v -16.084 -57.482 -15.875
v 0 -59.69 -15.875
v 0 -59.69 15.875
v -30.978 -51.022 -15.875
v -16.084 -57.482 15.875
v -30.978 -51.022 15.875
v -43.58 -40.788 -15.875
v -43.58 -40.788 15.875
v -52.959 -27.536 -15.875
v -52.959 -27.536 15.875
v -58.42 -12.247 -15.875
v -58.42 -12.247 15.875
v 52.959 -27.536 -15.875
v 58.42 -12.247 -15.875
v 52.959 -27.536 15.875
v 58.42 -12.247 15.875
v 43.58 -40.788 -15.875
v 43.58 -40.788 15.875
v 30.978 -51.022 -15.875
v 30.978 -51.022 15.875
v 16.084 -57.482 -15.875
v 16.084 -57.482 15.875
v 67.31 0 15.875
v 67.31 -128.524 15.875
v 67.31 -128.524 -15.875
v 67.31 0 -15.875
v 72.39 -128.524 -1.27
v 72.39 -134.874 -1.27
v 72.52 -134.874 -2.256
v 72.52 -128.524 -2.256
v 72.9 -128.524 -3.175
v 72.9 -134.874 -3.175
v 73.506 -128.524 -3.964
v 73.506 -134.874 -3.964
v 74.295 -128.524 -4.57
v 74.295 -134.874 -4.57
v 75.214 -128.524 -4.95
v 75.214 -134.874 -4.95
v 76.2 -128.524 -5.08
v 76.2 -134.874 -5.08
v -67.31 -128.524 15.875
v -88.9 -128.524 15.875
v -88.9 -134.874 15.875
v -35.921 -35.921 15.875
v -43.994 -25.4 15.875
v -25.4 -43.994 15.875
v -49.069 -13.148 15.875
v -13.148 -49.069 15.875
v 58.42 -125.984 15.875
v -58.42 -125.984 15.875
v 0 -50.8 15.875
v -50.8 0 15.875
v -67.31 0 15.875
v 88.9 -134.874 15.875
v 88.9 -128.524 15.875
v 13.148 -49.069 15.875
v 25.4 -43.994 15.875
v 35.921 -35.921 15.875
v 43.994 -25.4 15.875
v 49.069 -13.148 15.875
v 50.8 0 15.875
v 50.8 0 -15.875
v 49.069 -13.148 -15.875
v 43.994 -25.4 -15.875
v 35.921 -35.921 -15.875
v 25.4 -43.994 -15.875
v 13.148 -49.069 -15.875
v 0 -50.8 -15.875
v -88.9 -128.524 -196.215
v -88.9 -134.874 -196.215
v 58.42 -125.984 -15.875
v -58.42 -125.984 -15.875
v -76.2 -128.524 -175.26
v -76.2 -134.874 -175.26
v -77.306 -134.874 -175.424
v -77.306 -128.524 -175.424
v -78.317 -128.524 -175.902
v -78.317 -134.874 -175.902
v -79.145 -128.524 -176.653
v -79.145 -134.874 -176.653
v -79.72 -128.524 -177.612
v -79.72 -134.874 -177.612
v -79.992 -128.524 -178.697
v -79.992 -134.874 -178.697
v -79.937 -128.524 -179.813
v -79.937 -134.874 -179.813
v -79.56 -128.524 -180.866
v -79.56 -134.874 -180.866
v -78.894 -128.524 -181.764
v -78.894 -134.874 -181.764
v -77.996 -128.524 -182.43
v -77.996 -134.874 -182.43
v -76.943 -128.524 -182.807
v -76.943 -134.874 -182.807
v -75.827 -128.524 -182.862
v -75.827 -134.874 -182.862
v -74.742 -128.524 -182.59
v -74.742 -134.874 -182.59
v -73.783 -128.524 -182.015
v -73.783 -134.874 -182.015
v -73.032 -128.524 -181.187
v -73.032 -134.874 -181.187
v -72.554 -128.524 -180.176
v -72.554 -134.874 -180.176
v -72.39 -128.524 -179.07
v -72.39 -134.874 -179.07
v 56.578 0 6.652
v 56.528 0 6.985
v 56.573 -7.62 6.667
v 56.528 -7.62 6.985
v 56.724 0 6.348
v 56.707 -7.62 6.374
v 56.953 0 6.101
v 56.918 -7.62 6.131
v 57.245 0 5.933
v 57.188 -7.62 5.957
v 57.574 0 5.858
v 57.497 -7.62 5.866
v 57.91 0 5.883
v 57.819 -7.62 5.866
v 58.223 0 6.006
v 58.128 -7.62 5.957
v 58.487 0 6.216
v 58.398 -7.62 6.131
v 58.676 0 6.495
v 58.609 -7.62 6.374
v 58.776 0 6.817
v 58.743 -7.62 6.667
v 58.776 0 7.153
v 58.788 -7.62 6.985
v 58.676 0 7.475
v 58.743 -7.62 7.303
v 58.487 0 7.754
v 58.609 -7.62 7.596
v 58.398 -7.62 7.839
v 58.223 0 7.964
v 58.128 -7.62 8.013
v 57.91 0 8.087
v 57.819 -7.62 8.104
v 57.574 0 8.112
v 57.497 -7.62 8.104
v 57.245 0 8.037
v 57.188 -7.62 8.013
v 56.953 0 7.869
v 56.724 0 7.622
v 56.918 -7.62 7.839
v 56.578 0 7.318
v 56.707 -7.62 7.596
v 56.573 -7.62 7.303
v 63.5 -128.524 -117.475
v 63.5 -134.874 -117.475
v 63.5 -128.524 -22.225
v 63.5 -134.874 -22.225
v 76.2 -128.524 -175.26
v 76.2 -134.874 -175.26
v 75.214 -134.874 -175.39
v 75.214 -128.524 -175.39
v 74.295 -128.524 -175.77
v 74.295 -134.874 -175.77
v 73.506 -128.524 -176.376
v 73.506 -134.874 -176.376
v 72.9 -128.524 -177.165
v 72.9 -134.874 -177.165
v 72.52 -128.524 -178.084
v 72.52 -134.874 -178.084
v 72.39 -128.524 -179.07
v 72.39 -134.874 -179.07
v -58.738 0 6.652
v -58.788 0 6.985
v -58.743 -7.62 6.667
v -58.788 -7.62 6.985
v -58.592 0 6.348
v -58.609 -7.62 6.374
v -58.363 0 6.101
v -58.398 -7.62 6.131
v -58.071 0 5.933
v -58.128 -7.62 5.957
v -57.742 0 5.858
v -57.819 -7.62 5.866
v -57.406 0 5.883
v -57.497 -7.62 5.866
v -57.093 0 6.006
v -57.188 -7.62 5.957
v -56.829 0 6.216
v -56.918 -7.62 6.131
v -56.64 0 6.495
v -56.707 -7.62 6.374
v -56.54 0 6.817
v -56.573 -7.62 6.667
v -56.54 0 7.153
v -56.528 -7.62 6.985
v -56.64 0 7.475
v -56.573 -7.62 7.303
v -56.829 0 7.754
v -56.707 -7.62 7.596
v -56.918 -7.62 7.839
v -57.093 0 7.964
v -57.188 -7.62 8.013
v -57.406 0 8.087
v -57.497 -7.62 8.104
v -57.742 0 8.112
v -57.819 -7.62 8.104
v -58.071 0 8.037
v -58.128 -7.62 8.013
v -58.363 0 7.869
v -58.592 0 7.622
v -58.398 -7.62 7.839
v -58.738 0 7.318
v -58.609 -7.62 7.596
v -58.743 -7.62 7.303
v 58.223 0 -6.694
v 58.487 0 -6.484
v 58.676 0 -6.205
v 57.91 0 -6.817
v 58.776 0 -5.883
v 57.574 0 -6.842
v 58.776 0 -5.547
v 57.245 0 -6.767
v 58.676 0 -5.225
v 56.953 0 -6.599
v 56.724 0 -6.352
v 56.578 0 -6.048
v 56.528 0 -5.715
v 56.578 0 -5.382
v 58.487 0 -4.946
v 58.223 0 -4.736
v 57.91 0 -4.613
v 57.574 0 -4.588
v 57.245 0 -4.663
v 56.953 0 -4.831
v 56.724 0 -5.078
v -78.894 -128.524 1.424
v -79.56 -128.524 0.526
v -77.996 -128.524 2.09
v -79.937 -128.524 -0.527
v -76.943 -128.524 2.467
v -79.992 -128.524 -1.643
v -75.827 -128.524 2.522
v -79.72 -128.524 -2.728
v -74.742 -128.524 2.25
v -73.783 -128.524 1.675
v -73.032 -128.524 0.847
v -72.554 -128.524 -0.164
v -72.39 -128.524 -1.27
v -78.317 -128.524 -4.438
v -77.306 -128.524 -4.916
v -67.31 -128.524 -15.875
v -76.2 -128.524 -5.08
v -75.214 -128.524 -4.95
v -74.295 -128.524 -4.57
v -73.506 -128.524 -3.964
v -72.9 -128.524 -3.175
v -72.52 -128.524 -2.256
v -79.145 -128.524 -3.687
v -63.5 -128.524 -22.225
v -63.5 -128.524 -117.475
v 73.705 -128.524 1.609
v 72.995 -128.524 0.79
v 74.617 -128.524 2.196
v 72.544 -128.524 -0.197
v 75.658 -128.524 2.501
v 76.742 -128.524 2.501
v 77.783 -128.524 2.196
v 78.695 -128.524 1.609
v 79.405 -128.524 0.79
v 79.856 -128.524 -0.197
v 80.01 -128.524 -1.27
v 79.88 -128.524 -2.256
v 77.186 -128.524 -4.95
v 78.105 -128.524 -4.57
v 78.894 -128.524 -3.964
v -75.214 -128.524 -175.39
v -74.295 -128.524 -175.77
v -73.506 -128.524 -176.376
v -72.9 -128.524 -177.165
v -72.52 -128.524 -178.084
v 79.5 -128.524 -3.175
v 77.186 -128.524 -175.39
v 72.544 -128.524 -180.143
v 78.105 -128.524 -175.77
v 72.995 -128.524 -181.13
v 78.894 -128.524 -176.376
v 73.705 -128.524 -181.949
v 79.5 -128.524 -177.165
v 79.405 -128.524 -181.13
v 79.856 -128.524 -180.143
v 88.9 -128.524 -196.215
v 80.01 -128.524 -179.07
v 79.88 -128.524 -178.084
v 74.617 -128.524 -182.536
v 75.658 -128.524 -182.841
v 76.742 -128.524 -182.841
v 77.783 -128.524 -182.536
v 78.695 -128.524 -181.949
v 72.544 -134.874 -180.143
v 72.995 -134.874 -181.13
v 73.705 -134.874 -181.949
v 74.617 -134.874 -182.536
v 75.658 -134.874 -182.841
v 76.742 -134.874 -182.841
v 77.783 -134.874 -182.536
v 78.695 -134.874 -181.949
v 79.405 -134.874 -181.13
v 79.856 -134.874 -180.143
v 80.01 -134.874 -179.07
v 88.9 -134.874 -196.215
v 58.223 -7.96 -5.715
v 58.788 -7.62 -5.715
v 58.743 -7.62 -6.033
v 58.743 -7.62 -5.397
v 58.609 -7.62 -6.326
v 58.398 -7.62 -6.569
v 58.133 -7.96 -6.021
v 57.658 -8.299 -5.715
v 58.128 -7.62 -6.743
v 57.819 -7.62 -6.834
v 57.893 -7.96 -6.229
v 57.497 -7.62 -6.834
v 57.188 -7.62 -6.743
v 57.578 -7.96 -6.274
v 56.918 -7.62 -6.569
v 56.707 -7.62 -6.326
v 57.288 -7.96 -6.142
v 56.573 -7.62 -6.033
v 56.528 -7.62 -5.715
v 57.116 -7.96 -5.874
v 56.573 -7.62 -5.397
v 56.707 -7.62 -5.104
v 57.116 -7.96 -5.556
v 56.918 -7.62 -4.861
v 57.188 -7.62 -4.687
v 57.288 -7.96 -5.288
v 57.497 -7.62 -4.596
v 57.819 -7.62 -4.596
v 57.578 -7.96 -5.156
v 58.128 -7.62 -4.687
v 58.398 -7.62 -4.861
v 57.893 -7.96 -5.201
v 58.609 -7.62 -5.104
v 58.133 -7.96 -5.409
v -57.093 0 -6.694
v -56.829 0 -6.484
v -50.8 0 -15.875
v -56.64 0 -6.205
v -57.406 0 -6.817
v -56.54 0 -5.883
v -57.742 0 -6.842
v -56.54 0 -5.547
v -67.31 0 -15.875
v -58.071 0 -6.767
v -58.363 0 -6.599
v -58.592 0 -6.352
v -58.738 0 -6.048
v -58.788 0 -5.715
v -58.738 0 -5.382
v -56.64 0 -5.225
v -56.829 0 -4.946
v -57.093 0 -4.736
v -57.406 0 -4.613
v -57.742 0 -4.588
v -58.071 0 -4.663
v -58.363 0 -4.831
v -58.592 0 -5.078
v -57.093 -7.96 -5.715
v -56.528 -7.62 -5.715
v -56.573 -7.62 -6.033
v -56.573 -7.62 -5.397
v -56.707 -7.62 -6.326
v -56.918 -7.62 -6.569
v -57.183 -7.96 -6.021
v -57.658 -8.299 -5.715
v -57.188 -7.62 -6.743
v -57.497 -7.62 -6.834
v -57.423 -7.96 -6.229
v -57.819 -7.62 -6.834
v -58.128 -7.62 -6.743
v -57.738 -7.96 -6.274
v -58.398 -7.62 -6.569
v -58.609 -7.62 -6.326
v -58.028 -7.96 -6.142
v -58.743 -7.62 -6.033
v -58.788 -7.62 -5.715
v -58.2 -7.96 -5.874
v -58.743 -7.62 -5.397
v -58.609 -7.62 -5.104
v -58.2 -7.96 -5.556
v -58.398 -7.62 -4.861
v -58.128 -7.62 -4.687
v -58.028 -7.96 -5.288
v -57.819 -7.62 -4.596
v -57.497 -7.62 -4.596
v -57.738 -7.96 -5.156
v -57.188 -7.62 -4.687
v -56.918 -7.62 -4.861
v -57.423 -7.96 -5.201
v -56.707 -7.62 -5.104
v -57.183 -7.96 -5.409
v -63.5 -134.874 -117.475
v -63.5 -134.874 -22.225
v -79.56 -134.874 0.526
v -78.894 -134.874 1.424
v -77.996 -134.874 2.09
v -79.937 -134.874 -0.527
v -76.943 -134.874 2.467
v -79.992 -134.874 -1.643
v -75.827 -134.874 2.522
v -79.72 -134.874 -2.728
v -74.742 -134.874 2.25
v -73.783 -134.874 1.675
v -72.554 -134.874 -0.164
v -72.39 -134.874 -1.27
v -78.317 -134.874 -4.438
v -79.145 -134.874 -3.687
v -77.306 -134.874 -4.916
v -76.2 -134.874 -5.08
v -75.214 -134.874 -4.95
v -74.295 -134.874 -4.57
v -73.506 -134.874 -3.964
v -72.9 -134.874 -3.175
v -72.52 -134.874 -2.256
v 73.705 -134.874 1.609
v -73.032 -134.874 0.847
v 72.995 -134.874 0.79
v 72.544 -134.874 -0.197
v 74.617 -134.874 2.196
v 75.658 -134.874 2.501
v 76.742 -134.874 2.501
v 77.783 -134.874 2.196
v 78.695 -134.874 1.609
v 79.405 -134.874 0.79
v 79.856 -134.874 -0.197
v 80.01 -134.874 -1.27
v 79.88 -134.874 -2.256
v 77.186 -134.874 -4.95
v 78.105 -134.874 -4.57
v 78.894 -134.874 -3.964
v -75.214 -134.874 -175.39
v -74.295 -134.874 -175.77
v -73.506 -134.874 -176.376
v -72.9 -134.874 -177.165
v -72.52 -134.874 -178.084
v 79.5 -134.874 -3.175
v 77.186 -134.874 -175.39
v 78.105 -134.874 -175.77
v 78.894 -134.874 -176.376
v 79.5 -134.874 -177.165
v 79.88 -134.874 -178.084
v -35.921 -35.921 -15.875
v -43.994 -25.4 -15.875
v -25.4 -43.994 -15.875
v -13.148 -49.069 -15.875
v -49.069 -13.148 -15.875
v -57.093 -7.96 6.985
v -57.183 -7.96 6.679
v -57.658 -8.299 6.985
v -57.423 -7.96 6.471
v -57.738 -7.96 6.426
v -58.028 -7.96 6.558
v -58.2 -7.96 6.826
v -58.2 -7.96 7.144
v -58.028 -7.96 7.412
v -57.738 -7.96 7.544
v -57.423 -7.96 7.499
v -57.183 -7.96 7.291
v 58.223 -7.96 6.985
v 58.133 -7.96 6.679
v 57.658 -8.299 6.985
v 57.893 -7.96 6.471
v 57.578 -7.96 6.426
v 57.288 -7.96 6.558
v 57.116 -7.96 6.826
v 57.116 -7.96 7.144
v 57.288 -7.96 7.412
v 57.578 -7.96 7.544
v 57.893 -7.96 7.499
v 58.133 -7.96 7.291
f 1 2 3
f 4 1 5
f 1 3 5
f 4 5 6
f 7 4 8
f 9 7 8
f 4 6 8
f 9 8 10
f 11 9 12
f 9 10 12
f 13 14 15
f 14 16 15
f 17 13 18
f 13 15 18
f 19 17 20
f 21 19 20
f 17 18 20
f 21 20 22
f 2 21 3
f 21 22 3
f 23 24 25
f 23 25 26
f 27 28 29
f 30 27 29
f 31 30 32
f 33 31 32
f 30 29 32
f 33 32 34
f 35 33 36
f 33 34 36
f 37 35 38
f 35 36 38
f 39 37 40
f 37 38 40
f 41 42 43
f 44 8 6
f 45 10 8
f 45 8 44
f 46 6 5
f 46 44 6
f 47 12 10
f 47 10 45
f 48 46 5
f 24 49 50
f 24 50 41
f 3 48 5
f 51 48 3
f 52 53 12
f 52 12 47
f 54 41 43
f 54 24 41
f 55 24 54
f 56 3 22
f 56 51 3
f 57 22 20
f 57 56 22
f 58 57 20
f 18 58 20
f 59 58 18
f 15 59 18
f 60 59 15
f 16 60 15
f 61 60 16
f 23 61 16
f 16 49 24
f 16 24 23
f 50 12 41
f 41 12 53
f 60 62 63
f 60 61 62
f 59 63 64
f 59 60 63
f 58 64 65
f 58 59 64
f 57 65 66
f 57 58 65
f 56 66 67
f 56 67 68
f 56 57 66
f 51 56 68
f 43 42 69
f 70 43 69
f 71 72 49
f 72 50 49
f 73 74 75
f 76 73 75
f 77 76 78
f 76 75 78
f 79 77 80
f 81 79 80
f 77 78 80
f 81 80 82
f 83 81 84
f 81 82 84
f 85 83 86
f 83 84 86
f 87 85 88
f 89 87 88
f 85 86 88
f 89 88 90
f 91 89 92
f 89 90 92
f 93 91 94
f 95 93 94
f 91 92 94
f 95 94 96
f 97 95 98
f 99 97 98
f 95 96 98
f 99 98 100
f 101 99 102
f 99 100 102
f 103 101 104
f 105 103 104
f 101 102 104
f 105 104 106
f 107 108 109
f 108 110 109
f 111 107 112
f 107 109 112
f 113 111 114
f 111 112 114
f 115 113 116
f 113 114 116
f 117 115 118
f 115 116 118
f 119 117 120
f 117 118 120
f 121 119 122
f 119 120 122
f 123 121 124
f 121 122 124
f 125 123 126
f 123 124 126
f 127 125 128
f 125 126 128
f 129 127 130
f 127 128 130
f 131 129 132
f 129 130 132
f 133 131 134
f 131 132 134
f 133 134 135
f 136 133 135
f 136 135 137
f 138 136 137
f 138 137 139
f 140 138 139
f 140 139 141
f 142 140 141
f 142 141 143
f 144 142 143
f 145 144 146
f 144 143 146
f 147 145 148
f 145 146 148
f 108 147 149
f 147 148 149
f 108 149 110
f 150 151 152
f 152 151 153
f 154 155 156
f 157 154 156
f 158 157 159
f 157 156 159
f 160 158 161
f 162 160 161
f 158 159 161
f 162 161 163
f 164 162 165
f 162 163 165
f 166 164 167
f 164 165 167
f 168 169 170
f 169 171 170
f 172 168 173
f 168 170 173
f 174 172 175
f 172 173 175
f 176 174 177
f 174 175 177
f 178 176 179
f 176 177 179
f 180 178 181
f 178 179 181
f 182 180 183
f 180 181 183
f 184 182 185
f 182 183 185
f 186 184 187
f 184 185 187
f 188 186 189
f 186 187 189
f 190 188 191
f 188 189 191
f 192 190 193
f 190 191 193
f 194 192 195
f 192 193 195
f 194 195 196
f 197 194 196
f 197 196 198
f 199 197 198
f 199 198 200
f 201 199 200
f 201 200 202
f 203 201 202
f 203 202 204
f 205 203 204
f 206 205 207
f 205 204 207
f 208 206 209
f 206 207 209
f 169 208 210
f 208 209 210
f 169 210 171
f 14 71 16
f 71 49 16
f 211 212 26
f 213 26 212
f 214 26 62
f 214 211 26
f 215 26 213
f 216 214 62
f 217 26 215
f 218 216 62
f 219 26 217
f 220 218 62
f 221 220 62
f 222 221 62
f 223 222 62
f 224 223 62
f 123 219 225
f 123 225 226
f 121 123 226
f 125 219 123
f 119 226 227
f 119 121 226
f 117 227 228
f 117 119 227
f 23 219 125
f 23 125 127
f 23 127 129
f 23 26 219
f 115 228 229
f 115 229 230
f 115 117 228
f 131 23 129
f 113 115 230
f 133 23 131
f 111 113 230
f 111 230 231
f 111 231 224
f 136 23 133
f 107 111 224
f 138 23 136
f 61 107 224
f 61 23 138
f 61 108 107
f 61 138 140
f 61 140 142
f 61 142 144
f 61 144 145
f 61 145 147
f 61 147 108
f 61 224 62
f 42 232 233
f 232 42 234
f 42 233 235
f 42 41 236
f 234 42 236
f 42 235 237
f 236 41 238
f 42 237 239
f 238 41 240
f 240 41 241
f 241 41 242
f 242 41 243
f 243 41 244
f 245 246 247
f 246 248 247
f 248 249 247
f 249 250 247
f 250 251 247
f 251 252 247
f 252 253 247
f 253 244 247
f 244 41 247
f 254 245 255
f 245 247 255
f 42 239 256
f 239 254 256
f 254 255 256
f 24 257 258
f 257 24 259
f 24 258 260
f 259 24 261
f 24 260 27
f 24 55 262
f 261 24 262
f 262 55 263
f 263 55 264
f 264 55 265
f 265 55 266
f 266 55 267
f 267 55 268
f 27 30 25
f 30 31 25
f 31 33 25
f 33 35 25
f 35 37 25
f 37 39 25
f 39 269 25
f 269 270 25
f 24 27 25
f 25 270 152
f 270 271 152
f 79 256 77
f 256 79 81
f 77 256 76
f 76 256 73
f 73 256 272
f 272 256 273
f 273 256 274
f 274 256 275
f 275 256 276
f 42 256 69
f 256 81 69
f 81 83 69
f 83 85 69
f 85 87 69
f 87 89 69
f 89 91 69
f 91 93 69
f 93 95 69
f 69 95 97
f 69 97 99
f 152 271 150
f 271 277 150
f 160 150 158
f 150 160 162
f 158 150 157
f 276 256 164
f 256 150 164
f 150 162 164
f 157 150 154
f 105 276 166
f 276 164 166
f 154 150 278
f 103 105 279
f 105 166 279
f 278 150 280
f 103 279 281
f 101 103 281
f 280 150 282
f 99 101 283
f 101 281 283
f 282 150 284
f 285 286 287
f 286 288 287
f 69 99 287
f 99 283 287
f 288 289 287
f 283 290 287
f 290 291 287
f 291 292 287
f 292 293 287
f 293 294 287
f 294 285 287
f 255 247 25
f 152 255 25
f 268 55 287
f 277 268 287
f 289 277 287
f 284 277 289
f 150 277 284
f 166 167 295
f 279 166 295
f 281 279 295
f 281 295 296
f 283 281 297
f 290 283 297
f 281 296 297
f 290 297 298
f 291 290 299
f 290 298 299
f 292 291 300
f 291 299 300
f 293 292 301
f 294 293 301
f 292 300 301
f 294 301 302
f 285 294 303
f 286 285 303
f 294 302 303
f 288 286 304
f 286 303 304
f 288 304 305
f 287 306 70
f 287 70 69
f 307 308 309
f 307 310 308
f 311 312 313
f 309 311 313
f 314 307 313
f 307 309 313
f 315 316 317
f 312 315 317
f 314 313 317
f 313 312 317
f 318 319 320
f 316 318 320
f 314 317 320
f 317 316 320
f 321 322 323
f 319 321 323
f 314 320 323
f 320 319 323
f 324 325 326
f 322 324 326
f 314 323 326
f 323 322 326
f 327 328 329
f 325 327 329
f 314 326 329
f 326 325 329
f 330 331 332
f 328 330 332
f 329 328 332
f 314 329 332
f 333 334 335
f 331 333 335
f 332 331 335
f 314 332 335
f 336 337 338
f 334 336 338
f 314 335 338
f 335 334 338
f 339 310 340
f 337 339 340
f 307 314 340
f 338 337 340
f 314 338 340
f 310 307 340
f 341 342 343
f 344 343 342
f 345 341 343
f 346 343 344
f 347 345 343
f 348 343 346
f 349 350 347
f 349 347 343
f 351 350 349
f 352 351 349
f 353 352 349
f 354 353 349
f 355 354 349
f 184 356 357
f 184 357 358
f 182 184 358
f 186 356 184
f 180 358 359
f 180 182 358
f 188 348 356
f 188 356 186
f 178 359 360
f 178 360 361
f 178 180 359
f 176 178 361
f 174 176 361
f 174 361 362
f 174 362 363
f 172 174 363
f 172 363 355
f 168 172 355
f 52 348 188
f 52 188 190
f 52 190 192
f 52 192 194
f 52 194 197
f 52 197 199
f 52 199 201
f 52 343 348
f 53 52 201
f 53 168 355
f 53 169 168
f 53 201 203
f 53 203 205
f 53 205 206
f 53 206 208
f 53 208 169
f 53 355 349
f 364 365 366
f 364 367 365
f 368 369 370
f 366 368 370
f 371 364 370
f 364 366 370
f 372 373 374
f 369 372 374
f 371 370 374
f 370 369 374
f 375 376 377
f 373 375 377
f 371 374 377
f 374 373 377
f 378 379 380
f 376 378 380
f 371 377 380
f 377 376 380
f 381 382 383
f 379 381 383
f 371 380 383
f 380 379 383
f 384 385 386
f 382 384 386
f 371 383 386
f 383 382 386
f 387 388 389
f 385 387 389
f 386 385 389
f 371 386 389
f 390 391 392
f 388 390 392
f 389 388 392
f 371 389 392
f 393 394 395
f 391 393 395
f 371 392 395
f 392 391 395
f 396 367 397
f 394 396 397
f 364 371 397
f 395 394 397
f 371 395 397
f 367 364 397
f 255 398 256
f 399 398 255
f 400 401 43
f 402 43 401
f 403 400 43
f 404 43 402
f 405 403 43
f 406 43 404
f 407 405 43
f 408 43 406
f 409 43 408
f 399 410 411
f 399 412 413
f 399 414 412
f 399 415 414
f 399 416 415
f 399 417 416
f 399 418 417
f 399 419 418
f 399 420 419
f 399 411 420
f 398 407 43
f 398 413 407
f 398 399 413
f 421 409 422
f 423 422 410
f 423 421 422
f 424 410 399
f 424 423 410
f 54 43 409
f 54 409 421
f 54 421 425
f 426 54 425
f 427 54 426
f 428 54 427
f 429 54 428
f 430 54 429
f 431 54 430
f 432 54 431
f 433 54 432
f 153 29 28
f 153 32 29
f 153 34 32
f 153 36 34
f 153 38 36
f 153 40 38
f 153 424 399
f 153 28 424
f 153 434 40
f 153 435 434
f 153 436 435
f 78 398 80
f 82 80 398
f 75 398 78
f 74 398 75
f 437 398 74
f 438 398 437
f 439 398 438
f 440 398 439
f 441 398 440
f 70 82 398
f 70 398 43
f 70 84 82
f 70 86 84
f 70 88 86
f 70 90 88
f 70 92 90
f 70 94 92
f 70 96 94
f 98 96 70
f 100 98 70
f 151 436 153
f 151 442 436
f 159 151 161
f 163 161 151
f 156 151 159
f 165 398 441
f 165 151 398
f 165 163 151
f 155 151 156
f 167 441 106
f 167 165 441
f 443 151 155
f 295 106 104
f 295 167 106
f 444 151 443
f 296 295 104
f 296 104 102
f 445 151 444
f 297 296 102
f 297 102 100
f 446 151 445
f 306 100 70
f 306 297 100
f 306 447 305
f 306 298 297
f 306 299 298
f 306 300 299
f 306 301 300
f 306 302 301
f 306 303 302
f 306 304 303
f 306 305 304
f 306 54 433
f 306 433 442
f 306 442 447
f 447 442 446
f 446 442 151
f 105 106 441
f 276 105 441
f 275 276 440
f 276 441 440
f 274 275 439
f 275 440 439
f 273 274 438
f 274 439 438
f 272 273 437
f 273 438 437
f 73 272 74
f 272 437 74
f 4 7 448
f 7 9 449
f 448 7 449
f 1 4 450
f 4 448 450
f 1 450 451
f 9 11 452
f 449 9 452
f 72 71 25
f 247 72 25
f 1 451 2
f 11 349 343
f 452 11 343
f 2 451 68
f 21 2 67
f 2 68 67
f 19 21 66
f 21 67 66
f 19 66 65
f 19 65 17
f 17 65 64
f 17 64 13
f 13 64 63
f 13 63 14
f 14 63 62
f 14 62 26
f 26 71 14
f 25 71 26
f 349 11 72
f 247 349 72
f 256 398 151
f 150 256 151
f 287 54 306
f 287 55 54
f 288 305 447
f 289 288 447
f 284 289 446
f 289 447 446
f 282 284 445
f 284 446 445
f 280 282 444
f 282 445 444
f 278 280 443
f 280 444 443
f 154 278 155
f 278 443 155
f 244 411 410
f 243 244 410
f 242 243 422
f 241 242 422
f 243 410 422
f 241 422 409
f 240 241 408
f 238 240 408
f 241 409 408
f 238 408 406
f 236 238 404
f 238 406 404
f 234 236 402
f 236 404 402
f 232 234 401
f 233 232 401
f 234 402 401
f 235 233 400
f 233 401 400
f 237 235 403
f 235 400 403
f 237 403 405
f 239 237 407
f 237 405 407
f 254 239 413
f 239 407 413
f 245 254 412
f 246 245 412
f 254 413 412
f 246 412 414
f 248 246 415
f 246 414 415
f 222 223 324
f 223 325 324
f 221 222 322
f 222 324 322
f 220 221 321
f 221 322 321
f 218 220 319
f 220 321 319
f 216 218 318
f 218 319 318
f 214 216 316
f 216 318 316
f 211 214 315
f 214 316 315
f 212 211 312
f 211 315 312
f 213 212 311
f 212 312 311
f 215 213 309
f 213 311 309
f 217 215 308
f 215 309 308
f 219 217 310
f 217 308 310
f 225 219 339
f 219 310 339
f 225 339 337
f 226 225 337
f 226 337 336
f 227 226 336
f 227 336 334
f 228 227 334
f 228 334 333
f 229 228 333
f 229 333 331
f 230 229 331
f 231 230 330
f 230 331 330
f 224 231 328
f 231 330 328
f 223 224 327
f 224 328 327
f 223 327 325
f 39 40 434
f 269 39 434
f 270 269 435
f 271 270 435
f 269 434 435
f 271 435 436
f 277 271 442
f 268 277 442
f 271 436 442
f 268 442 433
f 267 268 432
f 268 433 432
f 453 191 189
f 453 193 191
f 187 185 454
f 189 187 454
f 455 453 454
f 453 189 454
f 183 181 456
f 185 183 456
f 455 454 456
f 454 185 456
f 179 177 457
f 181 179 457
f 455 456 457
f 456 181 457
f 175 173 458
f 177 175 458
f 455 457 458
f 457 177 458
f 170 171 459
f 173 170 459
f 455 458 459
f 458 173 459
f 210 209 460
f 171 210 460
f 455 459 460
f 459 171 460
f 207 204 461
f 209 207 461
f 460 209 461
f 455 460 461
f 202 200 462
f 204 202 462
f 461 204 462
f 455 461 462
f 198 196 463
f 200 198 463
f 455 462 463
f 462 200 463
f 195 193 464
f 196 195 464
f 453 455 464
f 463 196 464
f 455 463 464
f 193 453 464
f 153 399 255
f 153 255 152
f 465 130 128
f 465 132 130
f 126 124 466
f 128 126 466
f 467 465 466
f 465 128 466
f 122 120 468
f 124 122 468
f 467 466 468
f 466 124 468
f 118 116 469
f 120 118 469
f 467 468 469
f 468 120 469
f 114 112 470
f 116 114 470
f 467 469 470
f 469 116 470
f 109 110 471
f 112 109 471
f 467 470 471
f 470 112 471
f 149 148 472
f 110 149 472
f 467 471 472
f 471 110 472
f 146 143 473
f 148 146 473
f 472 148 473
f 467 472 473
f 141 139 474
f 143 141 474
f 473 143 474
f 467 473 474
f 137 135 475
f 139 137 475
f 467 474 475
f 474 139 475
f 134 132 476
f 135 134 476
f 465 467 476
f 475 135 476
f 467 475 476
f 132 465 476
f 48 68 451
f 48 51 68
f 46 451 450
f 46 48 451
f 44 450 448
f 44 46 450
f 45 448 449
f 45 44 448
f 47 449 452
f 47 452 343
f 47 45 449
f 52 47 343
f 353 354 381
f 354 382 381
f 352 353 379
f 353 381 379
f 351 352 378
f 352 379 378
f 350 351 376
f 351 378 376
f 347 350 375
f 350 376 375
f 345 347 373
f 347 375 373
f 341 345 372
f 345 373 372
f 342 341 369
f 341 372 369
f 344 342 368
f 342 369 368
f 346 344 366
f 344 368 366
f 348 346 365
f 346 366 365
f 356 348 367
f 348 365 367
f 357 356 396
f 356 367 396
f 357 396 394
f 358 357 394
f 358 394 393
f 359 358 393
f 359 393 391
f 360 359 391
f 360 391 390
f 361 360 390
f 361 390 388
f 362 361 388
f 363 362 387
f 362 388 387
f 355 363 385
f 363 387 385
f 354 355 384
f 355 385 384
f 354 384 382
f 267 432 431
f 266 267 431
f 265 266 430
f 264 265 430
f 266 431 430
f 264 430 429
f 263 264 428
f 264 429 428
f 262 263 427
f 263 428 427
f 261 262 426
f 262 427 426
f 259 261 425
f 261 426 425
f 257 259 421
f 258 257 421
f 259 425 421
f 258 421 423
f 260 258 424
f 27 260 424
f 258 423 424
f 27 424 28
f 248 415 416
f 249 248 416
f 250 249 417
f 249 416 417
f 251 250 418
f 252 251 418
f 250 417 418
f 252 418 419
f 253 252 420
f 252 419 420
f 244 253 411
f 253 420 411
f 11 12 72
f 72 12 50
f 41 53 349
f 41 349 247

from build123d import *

# Parameters (mm, degrees)
BOSS_EXTRUDE1_DEPTH       = 15.875
SHELL1_T                  = -8.89
F_4_40_TAPPED_HOLE1_D     = 2.2606
F_4_40_TAPPED_HOLE1_DEPTH = 7.62
F_4_40_TAPPED_HOLE1_TIP   = 0.679153
SKETCH6_W                 = 180.34
SKETCH6_H                 = 6.35
BOSS_EXTRUDE2_DEPTH       = 177.8
SKETCH7_W                 = 127
SKETCH7_H                 = 95.25
CUT_EXTRUDE2_DEPTH        = 7.62
CUT_EXTRUDE3_REACH        = 256.155


with BuildPart() as part:
    # Sketch1 → Boss-Extrude1 (new, symmetric)
    with BuildSketch(Plane.XY):
        with BuildLine():
            ThreePointArc((0, -50.8), (-35.921024, -35.921024), (-50.8, 0))
            Line((-50.8, 0), (-67.31, 0))
            Line((-67.31, 0), (-67.31, -128.524))
            Line((-67.31, -128.524), (-88.9, -128.524))
            Line((-88.9, -128.524), (-88.9, -134.874))
            Line((-88.9, -134.874), (0, -134.874))
            Line((0, -134.874), (0, -50.8))
        make_face()
        with BuildLine():
            ThreePointArc((50.8, 0), (35.921024, -35.921024), (0, -50.8))
            Line((0, -50.8), (0, -134.874))
            Line((0, -134.874), (88.9, -134.874))
            Line((88.9, -134.874), (88.9, -128.524))
            Line((88.9, -128.524), (67.31, -128.524))
            Line((67.31, -128.524), (67.31, 0))
            Line((67.31, 0), (50.8, 0))
        make_face()
    extrude(amount=BOSS_EXTRUDE1_DEPTH, both=True)

    # Shell1
    shell1_openings = [part.faces().sort_by_distance(p)[0] for p in [
        (0, -81.597488, 15.875),
        (0, -81.597488, -15.875),
    ]]
    offset(amount=SHELL1_T, openings=shell1_openings)

    # #4-40 Tapped Hole1
    with Locations(Plane(origin=(0, 0, 0), x_dir=(1, 0, 0), z_dir=(0, 1, 0))):
        with Locations((-57.658, 5.715), (-57.658, -6.985), (57.658, -6.985), (57.658, 5.715)):
            Hole(F_4_40_TAPPED_HOLE1_D / 2, depth=F_4_40_TAPPED_HOLE1_DEPTH)
            with Locations((0, 0, -(F_4_40_TAPPED_HOLE1_DEPTH + F_4_40_TAPPED_HOLE1_TIP / 2))):  # 118° drill point
                Cone(0, F_4_40_TAPPED_HOLE1_D / 2, F_4_40_TAPPED_HOLE1_TIP, mode=Mode.SUBTRACT)

    # Sketch6 → Boss-Extrude2 (add)
    with BuildSketch(Plane(origin=(88.9, 0, 0), x_dir=(0, 0, -1), z_dir=(1, 0, 0))):
        with Locations((106.045, -131.699)):
            Rectangle(SKETCH6_W, SKETCH6_H)
    extrude(amount=-BOSS_EXTRUDE2_DEPTH)

    # Sketch7 → Cut-Extrude2 (cut)
    with BuildSketch(Plane.XZ.offset(134.874)):
        with Locations((0, -69.85)):
            Rectangle(SKETCH7_W, SKETCH7_H)
    extrude(amount=-CUT_EXTRUDE2_DEPTH, mode=Mode.SUBTRACT)

    # Sketch8 → Cut-Extrude3 (cut, up to next)
    with BuildSketch(Plane.XZ.offset(134.874), mode=Mode.PRIVATE) as cut_extrude3_sk1:
        with BuildLine():
            ThreePointArc((72.39, -1.27), (73.505923, -3.964077), (76.2, -5.08))
            Line((76.2, -5.08), (76.2, -1.27))
            Line((76.2, -1.27), (72.39, -1.27))
        make_face()
    cut_extrude3_tool1 = extrude(cut_extrude3_sk1.sketch, amount=-CUT_EXTRUDE3_REACH, mode=Mode.PRIVATE) & part.part
    # Sketch8 → Cut-Extrude3 (cut, up to next)
    with BuildSketch(Plane.XZ.offset(134.874), mode=Mode.PRIVATE) as cut_extrude3_sk2:
        with BuildLine():
            Line((76.2, -1.27), (76.2, -5.08))
            ThreePointArc((76.2, -5.08), (78.894077, -3.964077), (80.01, -1.27))
            ThreePointArc((80.01, -1.27), (76.2, 2.54), (72.39, -1.27))
            Line((72.39, -1.27), (76.2, -1.27))
        make_face()
    cut_extrude3_tool2 = extrude(cut_extrude3_sk2.sketch, amount=-CUT_EXTRUDE3_REACH, mode=Mode.PRIVATE) & part.part
    # Sketch8 → Cut-Extrude3 (cut, up to next)
    with BuildSketch(Plane.XZ.offset(134.874), mode=Mode.PRIVATE) as cut_extrude3_sk3:
        with BuildLine():
            ThreePointArc((72.39, -1.27), (73.505923, -3.964077), (76.2, -5.08))
            Line((76.2, -5.08), (76.2, -1.27))
            Line((76.2, -1.27), (72.39, -1.27))
        make_face()
    cut_extrude3_tool3 = extrude(cut_extrude3_sk3.sketch, amount=-CUT_EXTRUDE3_REACH, mode=Mode.PRIVATE) & part.part
    # Sketch8 → Cut-Extrude3 (cut, up to next)
    with BuildSketch(Plane.XZ.offset(134.874), mode=Mode.PRIVATE) as cut_extrude3_sk4:
        with BuildLine():
            Line((76.2, -1.27), (76.2, -5.08))
            ThreePointArc((76.2, -5.08), (78.894077, -3.964077), (80.01, -1.27))
            ThreePointArc((80.01, -1.27), (76.2, 2.54), (72.39, -1.27))
            Line((72.39, -1.27), (76.2, -1.27))
        make_face()
    cut_extrude3_tool4 = extrude(cut_extrude3_sk4.sketch, amount=-CUT_EXTRUDE3_REACH, mode=Mode.PRIVATE) & part.part
    # Sketch8 → Cut-Extrude3 (cut, up to next)
    with BuildSketch(Plane.XZ.offset(134.874), mode=Mode.PRIVATE) as cut_extrude3_sk5:
        with BuildLine():
            ThreePointArc((-72.39, -1.27), (-78.894077, 1.424077), (-76.2, -5.08))
            Line((-76.2, -5.08), (-76.2, -1.27))
            Line((-76.2, -1.27), (-72.39, -1.27))
        make_face()
    cut_extrude3_tool5 = extrude(cut_extrude3_sk5.sketch, amount=-CUT_EXTRUDE3_REACH, mode=Mode.PRIVATE) & part.part
    # Sketch8 → Cut-Extrude3 (cut, up to next)
    with BuildSketch(Plane.XZ.offset(134.874), mode=Mode.PRIVATE) as cut_extrude3_sk6:
        with BuildLine():
            Line((-76.2, -1.27), (-76.2, -5.08))
            ThreePointArc((-76.2, -5.08), (-73.505923, -3.964077), (-72.39, -1.27))
            Line((-72.39, -1.27), (-76.2, -1.27))
        make_face()
    cut_extrude3_tool6 = extrude(cut_extrude3_sk6.sketch, amount=-CUT_EXTRUDE3_REACH, mode=Mode.PRIVATE) & part.part
    # Sketch8 → Cut-Extrude3 (cut, up to next)
    with BuildSketch(Plane.XZ.offset(134.874), mode=Mode.PRIVATE) as cut_extrude3_sk7:
        with BuildLine():
            ThreePointArc((-72.39, -1.27), (-78.894077, 1.424077), (-76.2, -5.08))
            Line((-76.2, -5.08), (-76.2, -1.27))
            Line((-76.2, -1.27), (-72.39, -1.27))
        make_face()
    cut_extrude3_tool7 = extrude(cut_extrude3_sk7.sketch, amount=-CUT_EXTRUDE3_REACH, mode=Mode.PRIVATE) & part.part
    # Sketch8 → Cut-Extrude3 (cut, up to next)
    with BuildSketch(Plane.XZ.offset(134.874), mode=Mode.PRIVATE) as cut_extrude3_sk8:
        with BuildLine():
            Line((-76.2, -1.27), (-76.2, -5.08))
            ThreePointArc((-76.2, -5.08), (-73.505923, -3.964077), (-72.39, -1.27))
            Line((-72.39, -1.27), (-76.2, -1.27))
        make_face()
    cut_extrude3_tool8 = extrude(cut_extrude3_sk8.sketch, amount=-CUT_EXTRUDE3_REACH, mode=Mode.PRIVATE) & part.part
    # Sketch8 → Cut-Extrude3 (cut, up to next)
    with BuildSketch(Plane.XZ.offset(134.874), mode=Mode.PRIVATE) as cut_extrude3_sk9:
        with BuildLine():
            ThreePointArc((-76.2, -175.26), (-78.894077, -181.764077), (-72.39, -179.07))
            Line((-72.39, -179.07), (-76.2, -179.07))
            Line((-76.2, -179.07), (-76.2, -175.26))
        make_face()
    cut_extrude3_tool9 = extrude(cut_extrude3_sk9.sketch, amount=-CUT_EXTRUDE3_REACH, mode=Mode.PRIVATE) & part.part
    # Sketch8 → Cut-Extrude3 (cut, up to next)
    with BuildSketch(Plane.XZ.offset(134.874), mode=Mode.PRIVATE) as cut_extrude3_sk10:
        with BuildLine():
            Line((-76.2, -179.07), (-72.39, -179.07))
            ThreePointArc((-72.39, -179.07), (-73.505923, -176.375923), (-76.2, -175.26))
            Line((-76.2, -175.26), (-76.2, -179.07))
        make_face()
    cut_extrude3_tool10 = extrude(cut_extrude3_sk10.sketch, amount=-CUT_EXTRUDE3_REACH, mode=Mode.PRIVATE) & part.part
    # Sketch8 → Cut-Extrude3 (cut, up to next)
    with BuildSketch(Plane.XZ.offset(134.874), mode=Mode.PRIVATE) as cut_extrude3_sk11:
        with BuildLine():
            ThreePointArc((-76.2, -175.26), (-78.894077, -181.764077), (-72.39, -179.07))
            Line((-72.39, -179.07), (-76.2, -179.07))
            Line((-76.2, -179.07), (-76.2, -175.26))
        make_face()
    cut_extrude3_tool11 = extrude(cut_extrude3_sk11.sketch, amount=-CUT_EXTRUDE3_REACH, mode=Mode.PRIVATE) & part.part
    # Sketch8 → Cut-Extrude3 (cut, up to next)
    with BuildSketch(Plane.XZ.offset(134.874), mode=Mode.PRIVATE) as cut_extrude3_sk12:
        with BuildLine():
            Line((-76.2, -179.07), (-72.39, -179.07))
            ThreePointArc((-72.39, -179.07), (-73.505923, -176.375923), (-76.2, -175.26))
            Line((-76.2, -175.26), (-76.2, -179.07))
        make_face()
    cut_extrude3_tool12 = extrude(cut_extrude3_sk12.sketch, amount=-CUT_EXTRUDE3_REACH, mode=Mode.PRIVATE) & part.part
    # Sketch8 → Cut-Extrude3 (cut, up to next)
    with BuildSketch(Plane.XZ.offset(134.874), mode=Mode.PRIVATE) as cut_extrude3_sk13:
        with BuildLine():
            ThreePointArc((76.2, -175.26), (73.505923, -176.375923), (72.39, -179.07))
            Line((72.39, -179.07), (76.2, -179.07))
            Line((76.2, -179.07), (76.2, -175.26))
        make_face()
    cut_extrude3_tool13 = extrude(cut_extrude3_sk13.sketch, amount=-CUT_EXTRUDE3_REACH, mode=Mode.PRIVATE) & part.part
    # Sketch8 → Cut-Extrude3 (cut, up to next)
    with BuildSketch(Plane.XZ.offset(134.874), mode=Mode.PRIVATE) as cut_extrude3_sk14:
        with BuildLine():
            Line((76.2, -179.07), (72.39, -179.07))
            ThreePointArc((72.39, -179.07), (76.2, -182.88), (80.01, -179.07))
            ThreePointArc((80.01, -179.07), (78.894077, -176.375923), (76.2, -175.26))
            Line((76.2, -175.26), (76.2, -179.07))
        make_face()
    cut_extrude3_tool14 = extrude(cut_extrude3_sk14.sketch, amount=-CUT_EXTRUDE3_REACH, mode=Mode.PRIVATE) & part.part
    # Sketch8 → Cut-Extrude3 (cut, up to next)
    with BuildSketch(Plane.XZ.offset(134.874), mode=Mode.PRIVATE) as cut_extrude3_sk15:
        with BuildLine():
            ThreePointArc((76.2, -175.26), (73.505923, -176.375923), (72.39, -179.07))
            Line((72.39, -179.07), (76.2, -179.07))
            Line((76.2, -179.07), (76.2, -175.26))
        make_face()
    cut_extrude3_tool15 = extrude(cut_extrude3_sk15.sketch, amount=-CUT_EXTRUDE3_REACH, mode=Mode.PRIVATE) & part.part
    # Sketch8 → Cut-Extrude3 (cut, up to next)
    with BuildSketch(Plane.XZ.offset(134.874), mode=Mode.PRIVATE) as cut_extrude3_sk16:
        with BuildLine():
            Line((76.2, -179.07), (72.39, -179.07))
            ThreePointArc((72.39, -179.07), (76.2, -182.88), (80.01, -179.07))
            ThreePointArc((80.01, -179.07), (78.894077, -176.375923), (76.2, -175.26))
            Line((76.2, -175.26), (76.2, -179.07))
        make_face()
    cut_extrude3_tool16 = extrude(cut_extrude3_sk16.sketch, amount=-CUT_EXTRUDE3_REACH, mode=Mode.PRIVATE) & part.part
    add(cut_extrude3_tool1.solids().sort_by_distance((74.582986, -134.874, -2.887014))[0], mode=Mode.SUBTRACT)
    add(cut_extrude3_tool2.solids().sort_by_distance((76.739005, -134.874, -0.730995))[0], mode=Mode.SUBTRACT)
    add(cut_extrude3_tool3.solids().sort_by_distance((74.582986, -134.874, -2.887014))[0], mode=Mode.SUBTRACT)
    add(cut_extrude3_tool4.solids().sort_by_distance((76.739005, -134.874, -0.730995))[0], mode=Mode.SUBTRACT)
    add(cut_extrude3_tool5.solids().sort_by_distance((-76.739005, -134.874, -0.730995))[0], mode=Mode.SUBTRACT)
    add(cut_extrude3_tool6.solids().sort_by_distance((-74.582986, -134.874, -2.887014))[0], mode=Mode.SUBTRACT)
    add(cut_extrude3_tool7.solids().sort_by_distance((-76.739005, -134.874, -0.730995))[0], mode=Mode.SUBTRACT)
    add(cut_extrude3_tool8.solids().sort_by_distance((-74.582986, -134.874, -2.887014))[0], mode=Mode.SUBTRACT)
    add(cut_extrude3_tool9.solids().sort_by_distance((-76.739005, -134.874, -179.609005))[0], mode=Mode.SUBTRACT)
    add(cut_extrude3_tool10.solids().sort_by_distance((-74.582986, -134.874, -177.452986))[0], mode=Mode.SUBTRACT)
    add(cut_extrude3_tool11.solids().sort_by_distance((-76.739005, -134.874, -179.609005))[0], mode=Mode.SUBTRACT)
    add(cut_extrude3_tool12.solids().sort_by_distance((-74.582986, -134.874, -177.452986))[0], mode=Mode.SUBTRACT)
    add(cut_extrude3_tool13.solids().sort_by_distance((74.582986, -134.874, -177.452986))[0], mode=Mode.SUBTRACT)
    add(cut_extrude3_tool14.solids().sort_by_distance((76.739005, -134.874, -179.609005))[0], mode=Mode.SUBTRACT)
    add(cut_extrude3_tool15.solids().sort_by_distance((74.582986, -134.874, -177.452986))[0], mode=Mode.SUBTRACT)
    add(cut_extrude3_tool16.solids().sort_by_distance((76.739005, -134.874, -179.609005))[0], mode=Mode.SUBTRACT)


solid = part.part
